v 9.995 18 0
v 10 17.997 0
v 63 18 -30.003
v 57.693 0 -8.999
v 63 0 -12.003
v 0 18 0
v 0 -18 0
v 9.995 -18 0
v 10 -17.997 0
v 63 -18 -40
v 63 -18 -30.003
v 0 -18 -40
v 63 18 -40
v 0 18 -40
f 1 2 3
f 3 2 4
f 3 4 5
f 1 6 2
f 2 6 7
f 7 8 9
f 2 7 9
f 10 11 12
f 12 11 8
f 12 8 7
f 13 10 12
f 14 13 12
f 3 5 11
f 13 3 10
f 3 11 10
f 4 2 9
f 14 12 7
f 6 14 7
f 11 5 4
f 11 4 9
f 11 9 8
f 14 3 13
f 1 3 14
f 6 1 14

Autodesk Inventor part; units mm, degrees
ref_plane "YZ Plane" through (0, 0, 0) normal (1, 0, 0) x (0, 1, 0)
ref_plane "XZ Plane" through (0, 0, 0) normal (0, 1, 0) x (-1, 0, 0)
sketch "草圖1" plane through (0, 0, 0) normal (0, 1, 0) x (-1, 0, 0)
  line L0 (0, 0) -> (-63, 0)
  line L1 (-63, 0) -> (-63, -40)
  line L2 (-63, -40) -> (0, -40)
  line L3 (0, -40) -> (0, 0)
  dimension "d0" = 63
  dimension "d1" = 40
extrude "擠出1" add sketch "草圖1" along normal mid plane 36
sketch "草圖2" plane through (0, 18, 0) normal (0, 1, 0) x (1, 0, 0)
  line L0 (0, 0) -> (63, 0) projected
  line L1 (10, 0) -> (63, 10)
  line L2 (63, 0) -> (63, 40) projected
  dimension "d4" = 10
  dimension "d5" = 30
extrude "擠出2" cut sketch "草圖2" against normal blind 40
sketch "草圖3" plane through (63, -18, -40) normal (1, 0, 0) x (0, 0, -1)
  line L0 (-30, 16) -> (-10, 36)
  line L1 (0, 36) -> (-40, 36) projected
  line L2 (-30, 36) -> (-30, 0) projected
  point P0 (-40, 18)
  dimension "d8" = 20
  dimension "d9" = 20
ref_plane "工作平面1" through (10, 18, 0) normal (-0.3716, -0.6565, -0.6565) x (0.8703, 0, -0.4926)
sketch "草圖4" plane through (10, 18, 0) normal (-0.3716, -0.6565, -0.6565) x (0.8703, 0, -0.4926)
  line L0 (-15.1543, -12.3218) -> (93.717, -12.3218)
  line L1 (93.717, -12.3218) -> (93.717, 28.8166)
  line L2 (93.717, 28.8166) -> (-15.1543, 28.8166)
  line L3 (-15.1543, 28.8166) -> (-15.1543, -12.3218)
  point P0 (-8.7026, 10.3445)
extrude "擠出3" cut sketch "草圖4" against normal blind 40
mirror "鏡射1" about plane through (0, 0, 0) normal (0, 1, 0) of "擠出3"
properties part number "14"
